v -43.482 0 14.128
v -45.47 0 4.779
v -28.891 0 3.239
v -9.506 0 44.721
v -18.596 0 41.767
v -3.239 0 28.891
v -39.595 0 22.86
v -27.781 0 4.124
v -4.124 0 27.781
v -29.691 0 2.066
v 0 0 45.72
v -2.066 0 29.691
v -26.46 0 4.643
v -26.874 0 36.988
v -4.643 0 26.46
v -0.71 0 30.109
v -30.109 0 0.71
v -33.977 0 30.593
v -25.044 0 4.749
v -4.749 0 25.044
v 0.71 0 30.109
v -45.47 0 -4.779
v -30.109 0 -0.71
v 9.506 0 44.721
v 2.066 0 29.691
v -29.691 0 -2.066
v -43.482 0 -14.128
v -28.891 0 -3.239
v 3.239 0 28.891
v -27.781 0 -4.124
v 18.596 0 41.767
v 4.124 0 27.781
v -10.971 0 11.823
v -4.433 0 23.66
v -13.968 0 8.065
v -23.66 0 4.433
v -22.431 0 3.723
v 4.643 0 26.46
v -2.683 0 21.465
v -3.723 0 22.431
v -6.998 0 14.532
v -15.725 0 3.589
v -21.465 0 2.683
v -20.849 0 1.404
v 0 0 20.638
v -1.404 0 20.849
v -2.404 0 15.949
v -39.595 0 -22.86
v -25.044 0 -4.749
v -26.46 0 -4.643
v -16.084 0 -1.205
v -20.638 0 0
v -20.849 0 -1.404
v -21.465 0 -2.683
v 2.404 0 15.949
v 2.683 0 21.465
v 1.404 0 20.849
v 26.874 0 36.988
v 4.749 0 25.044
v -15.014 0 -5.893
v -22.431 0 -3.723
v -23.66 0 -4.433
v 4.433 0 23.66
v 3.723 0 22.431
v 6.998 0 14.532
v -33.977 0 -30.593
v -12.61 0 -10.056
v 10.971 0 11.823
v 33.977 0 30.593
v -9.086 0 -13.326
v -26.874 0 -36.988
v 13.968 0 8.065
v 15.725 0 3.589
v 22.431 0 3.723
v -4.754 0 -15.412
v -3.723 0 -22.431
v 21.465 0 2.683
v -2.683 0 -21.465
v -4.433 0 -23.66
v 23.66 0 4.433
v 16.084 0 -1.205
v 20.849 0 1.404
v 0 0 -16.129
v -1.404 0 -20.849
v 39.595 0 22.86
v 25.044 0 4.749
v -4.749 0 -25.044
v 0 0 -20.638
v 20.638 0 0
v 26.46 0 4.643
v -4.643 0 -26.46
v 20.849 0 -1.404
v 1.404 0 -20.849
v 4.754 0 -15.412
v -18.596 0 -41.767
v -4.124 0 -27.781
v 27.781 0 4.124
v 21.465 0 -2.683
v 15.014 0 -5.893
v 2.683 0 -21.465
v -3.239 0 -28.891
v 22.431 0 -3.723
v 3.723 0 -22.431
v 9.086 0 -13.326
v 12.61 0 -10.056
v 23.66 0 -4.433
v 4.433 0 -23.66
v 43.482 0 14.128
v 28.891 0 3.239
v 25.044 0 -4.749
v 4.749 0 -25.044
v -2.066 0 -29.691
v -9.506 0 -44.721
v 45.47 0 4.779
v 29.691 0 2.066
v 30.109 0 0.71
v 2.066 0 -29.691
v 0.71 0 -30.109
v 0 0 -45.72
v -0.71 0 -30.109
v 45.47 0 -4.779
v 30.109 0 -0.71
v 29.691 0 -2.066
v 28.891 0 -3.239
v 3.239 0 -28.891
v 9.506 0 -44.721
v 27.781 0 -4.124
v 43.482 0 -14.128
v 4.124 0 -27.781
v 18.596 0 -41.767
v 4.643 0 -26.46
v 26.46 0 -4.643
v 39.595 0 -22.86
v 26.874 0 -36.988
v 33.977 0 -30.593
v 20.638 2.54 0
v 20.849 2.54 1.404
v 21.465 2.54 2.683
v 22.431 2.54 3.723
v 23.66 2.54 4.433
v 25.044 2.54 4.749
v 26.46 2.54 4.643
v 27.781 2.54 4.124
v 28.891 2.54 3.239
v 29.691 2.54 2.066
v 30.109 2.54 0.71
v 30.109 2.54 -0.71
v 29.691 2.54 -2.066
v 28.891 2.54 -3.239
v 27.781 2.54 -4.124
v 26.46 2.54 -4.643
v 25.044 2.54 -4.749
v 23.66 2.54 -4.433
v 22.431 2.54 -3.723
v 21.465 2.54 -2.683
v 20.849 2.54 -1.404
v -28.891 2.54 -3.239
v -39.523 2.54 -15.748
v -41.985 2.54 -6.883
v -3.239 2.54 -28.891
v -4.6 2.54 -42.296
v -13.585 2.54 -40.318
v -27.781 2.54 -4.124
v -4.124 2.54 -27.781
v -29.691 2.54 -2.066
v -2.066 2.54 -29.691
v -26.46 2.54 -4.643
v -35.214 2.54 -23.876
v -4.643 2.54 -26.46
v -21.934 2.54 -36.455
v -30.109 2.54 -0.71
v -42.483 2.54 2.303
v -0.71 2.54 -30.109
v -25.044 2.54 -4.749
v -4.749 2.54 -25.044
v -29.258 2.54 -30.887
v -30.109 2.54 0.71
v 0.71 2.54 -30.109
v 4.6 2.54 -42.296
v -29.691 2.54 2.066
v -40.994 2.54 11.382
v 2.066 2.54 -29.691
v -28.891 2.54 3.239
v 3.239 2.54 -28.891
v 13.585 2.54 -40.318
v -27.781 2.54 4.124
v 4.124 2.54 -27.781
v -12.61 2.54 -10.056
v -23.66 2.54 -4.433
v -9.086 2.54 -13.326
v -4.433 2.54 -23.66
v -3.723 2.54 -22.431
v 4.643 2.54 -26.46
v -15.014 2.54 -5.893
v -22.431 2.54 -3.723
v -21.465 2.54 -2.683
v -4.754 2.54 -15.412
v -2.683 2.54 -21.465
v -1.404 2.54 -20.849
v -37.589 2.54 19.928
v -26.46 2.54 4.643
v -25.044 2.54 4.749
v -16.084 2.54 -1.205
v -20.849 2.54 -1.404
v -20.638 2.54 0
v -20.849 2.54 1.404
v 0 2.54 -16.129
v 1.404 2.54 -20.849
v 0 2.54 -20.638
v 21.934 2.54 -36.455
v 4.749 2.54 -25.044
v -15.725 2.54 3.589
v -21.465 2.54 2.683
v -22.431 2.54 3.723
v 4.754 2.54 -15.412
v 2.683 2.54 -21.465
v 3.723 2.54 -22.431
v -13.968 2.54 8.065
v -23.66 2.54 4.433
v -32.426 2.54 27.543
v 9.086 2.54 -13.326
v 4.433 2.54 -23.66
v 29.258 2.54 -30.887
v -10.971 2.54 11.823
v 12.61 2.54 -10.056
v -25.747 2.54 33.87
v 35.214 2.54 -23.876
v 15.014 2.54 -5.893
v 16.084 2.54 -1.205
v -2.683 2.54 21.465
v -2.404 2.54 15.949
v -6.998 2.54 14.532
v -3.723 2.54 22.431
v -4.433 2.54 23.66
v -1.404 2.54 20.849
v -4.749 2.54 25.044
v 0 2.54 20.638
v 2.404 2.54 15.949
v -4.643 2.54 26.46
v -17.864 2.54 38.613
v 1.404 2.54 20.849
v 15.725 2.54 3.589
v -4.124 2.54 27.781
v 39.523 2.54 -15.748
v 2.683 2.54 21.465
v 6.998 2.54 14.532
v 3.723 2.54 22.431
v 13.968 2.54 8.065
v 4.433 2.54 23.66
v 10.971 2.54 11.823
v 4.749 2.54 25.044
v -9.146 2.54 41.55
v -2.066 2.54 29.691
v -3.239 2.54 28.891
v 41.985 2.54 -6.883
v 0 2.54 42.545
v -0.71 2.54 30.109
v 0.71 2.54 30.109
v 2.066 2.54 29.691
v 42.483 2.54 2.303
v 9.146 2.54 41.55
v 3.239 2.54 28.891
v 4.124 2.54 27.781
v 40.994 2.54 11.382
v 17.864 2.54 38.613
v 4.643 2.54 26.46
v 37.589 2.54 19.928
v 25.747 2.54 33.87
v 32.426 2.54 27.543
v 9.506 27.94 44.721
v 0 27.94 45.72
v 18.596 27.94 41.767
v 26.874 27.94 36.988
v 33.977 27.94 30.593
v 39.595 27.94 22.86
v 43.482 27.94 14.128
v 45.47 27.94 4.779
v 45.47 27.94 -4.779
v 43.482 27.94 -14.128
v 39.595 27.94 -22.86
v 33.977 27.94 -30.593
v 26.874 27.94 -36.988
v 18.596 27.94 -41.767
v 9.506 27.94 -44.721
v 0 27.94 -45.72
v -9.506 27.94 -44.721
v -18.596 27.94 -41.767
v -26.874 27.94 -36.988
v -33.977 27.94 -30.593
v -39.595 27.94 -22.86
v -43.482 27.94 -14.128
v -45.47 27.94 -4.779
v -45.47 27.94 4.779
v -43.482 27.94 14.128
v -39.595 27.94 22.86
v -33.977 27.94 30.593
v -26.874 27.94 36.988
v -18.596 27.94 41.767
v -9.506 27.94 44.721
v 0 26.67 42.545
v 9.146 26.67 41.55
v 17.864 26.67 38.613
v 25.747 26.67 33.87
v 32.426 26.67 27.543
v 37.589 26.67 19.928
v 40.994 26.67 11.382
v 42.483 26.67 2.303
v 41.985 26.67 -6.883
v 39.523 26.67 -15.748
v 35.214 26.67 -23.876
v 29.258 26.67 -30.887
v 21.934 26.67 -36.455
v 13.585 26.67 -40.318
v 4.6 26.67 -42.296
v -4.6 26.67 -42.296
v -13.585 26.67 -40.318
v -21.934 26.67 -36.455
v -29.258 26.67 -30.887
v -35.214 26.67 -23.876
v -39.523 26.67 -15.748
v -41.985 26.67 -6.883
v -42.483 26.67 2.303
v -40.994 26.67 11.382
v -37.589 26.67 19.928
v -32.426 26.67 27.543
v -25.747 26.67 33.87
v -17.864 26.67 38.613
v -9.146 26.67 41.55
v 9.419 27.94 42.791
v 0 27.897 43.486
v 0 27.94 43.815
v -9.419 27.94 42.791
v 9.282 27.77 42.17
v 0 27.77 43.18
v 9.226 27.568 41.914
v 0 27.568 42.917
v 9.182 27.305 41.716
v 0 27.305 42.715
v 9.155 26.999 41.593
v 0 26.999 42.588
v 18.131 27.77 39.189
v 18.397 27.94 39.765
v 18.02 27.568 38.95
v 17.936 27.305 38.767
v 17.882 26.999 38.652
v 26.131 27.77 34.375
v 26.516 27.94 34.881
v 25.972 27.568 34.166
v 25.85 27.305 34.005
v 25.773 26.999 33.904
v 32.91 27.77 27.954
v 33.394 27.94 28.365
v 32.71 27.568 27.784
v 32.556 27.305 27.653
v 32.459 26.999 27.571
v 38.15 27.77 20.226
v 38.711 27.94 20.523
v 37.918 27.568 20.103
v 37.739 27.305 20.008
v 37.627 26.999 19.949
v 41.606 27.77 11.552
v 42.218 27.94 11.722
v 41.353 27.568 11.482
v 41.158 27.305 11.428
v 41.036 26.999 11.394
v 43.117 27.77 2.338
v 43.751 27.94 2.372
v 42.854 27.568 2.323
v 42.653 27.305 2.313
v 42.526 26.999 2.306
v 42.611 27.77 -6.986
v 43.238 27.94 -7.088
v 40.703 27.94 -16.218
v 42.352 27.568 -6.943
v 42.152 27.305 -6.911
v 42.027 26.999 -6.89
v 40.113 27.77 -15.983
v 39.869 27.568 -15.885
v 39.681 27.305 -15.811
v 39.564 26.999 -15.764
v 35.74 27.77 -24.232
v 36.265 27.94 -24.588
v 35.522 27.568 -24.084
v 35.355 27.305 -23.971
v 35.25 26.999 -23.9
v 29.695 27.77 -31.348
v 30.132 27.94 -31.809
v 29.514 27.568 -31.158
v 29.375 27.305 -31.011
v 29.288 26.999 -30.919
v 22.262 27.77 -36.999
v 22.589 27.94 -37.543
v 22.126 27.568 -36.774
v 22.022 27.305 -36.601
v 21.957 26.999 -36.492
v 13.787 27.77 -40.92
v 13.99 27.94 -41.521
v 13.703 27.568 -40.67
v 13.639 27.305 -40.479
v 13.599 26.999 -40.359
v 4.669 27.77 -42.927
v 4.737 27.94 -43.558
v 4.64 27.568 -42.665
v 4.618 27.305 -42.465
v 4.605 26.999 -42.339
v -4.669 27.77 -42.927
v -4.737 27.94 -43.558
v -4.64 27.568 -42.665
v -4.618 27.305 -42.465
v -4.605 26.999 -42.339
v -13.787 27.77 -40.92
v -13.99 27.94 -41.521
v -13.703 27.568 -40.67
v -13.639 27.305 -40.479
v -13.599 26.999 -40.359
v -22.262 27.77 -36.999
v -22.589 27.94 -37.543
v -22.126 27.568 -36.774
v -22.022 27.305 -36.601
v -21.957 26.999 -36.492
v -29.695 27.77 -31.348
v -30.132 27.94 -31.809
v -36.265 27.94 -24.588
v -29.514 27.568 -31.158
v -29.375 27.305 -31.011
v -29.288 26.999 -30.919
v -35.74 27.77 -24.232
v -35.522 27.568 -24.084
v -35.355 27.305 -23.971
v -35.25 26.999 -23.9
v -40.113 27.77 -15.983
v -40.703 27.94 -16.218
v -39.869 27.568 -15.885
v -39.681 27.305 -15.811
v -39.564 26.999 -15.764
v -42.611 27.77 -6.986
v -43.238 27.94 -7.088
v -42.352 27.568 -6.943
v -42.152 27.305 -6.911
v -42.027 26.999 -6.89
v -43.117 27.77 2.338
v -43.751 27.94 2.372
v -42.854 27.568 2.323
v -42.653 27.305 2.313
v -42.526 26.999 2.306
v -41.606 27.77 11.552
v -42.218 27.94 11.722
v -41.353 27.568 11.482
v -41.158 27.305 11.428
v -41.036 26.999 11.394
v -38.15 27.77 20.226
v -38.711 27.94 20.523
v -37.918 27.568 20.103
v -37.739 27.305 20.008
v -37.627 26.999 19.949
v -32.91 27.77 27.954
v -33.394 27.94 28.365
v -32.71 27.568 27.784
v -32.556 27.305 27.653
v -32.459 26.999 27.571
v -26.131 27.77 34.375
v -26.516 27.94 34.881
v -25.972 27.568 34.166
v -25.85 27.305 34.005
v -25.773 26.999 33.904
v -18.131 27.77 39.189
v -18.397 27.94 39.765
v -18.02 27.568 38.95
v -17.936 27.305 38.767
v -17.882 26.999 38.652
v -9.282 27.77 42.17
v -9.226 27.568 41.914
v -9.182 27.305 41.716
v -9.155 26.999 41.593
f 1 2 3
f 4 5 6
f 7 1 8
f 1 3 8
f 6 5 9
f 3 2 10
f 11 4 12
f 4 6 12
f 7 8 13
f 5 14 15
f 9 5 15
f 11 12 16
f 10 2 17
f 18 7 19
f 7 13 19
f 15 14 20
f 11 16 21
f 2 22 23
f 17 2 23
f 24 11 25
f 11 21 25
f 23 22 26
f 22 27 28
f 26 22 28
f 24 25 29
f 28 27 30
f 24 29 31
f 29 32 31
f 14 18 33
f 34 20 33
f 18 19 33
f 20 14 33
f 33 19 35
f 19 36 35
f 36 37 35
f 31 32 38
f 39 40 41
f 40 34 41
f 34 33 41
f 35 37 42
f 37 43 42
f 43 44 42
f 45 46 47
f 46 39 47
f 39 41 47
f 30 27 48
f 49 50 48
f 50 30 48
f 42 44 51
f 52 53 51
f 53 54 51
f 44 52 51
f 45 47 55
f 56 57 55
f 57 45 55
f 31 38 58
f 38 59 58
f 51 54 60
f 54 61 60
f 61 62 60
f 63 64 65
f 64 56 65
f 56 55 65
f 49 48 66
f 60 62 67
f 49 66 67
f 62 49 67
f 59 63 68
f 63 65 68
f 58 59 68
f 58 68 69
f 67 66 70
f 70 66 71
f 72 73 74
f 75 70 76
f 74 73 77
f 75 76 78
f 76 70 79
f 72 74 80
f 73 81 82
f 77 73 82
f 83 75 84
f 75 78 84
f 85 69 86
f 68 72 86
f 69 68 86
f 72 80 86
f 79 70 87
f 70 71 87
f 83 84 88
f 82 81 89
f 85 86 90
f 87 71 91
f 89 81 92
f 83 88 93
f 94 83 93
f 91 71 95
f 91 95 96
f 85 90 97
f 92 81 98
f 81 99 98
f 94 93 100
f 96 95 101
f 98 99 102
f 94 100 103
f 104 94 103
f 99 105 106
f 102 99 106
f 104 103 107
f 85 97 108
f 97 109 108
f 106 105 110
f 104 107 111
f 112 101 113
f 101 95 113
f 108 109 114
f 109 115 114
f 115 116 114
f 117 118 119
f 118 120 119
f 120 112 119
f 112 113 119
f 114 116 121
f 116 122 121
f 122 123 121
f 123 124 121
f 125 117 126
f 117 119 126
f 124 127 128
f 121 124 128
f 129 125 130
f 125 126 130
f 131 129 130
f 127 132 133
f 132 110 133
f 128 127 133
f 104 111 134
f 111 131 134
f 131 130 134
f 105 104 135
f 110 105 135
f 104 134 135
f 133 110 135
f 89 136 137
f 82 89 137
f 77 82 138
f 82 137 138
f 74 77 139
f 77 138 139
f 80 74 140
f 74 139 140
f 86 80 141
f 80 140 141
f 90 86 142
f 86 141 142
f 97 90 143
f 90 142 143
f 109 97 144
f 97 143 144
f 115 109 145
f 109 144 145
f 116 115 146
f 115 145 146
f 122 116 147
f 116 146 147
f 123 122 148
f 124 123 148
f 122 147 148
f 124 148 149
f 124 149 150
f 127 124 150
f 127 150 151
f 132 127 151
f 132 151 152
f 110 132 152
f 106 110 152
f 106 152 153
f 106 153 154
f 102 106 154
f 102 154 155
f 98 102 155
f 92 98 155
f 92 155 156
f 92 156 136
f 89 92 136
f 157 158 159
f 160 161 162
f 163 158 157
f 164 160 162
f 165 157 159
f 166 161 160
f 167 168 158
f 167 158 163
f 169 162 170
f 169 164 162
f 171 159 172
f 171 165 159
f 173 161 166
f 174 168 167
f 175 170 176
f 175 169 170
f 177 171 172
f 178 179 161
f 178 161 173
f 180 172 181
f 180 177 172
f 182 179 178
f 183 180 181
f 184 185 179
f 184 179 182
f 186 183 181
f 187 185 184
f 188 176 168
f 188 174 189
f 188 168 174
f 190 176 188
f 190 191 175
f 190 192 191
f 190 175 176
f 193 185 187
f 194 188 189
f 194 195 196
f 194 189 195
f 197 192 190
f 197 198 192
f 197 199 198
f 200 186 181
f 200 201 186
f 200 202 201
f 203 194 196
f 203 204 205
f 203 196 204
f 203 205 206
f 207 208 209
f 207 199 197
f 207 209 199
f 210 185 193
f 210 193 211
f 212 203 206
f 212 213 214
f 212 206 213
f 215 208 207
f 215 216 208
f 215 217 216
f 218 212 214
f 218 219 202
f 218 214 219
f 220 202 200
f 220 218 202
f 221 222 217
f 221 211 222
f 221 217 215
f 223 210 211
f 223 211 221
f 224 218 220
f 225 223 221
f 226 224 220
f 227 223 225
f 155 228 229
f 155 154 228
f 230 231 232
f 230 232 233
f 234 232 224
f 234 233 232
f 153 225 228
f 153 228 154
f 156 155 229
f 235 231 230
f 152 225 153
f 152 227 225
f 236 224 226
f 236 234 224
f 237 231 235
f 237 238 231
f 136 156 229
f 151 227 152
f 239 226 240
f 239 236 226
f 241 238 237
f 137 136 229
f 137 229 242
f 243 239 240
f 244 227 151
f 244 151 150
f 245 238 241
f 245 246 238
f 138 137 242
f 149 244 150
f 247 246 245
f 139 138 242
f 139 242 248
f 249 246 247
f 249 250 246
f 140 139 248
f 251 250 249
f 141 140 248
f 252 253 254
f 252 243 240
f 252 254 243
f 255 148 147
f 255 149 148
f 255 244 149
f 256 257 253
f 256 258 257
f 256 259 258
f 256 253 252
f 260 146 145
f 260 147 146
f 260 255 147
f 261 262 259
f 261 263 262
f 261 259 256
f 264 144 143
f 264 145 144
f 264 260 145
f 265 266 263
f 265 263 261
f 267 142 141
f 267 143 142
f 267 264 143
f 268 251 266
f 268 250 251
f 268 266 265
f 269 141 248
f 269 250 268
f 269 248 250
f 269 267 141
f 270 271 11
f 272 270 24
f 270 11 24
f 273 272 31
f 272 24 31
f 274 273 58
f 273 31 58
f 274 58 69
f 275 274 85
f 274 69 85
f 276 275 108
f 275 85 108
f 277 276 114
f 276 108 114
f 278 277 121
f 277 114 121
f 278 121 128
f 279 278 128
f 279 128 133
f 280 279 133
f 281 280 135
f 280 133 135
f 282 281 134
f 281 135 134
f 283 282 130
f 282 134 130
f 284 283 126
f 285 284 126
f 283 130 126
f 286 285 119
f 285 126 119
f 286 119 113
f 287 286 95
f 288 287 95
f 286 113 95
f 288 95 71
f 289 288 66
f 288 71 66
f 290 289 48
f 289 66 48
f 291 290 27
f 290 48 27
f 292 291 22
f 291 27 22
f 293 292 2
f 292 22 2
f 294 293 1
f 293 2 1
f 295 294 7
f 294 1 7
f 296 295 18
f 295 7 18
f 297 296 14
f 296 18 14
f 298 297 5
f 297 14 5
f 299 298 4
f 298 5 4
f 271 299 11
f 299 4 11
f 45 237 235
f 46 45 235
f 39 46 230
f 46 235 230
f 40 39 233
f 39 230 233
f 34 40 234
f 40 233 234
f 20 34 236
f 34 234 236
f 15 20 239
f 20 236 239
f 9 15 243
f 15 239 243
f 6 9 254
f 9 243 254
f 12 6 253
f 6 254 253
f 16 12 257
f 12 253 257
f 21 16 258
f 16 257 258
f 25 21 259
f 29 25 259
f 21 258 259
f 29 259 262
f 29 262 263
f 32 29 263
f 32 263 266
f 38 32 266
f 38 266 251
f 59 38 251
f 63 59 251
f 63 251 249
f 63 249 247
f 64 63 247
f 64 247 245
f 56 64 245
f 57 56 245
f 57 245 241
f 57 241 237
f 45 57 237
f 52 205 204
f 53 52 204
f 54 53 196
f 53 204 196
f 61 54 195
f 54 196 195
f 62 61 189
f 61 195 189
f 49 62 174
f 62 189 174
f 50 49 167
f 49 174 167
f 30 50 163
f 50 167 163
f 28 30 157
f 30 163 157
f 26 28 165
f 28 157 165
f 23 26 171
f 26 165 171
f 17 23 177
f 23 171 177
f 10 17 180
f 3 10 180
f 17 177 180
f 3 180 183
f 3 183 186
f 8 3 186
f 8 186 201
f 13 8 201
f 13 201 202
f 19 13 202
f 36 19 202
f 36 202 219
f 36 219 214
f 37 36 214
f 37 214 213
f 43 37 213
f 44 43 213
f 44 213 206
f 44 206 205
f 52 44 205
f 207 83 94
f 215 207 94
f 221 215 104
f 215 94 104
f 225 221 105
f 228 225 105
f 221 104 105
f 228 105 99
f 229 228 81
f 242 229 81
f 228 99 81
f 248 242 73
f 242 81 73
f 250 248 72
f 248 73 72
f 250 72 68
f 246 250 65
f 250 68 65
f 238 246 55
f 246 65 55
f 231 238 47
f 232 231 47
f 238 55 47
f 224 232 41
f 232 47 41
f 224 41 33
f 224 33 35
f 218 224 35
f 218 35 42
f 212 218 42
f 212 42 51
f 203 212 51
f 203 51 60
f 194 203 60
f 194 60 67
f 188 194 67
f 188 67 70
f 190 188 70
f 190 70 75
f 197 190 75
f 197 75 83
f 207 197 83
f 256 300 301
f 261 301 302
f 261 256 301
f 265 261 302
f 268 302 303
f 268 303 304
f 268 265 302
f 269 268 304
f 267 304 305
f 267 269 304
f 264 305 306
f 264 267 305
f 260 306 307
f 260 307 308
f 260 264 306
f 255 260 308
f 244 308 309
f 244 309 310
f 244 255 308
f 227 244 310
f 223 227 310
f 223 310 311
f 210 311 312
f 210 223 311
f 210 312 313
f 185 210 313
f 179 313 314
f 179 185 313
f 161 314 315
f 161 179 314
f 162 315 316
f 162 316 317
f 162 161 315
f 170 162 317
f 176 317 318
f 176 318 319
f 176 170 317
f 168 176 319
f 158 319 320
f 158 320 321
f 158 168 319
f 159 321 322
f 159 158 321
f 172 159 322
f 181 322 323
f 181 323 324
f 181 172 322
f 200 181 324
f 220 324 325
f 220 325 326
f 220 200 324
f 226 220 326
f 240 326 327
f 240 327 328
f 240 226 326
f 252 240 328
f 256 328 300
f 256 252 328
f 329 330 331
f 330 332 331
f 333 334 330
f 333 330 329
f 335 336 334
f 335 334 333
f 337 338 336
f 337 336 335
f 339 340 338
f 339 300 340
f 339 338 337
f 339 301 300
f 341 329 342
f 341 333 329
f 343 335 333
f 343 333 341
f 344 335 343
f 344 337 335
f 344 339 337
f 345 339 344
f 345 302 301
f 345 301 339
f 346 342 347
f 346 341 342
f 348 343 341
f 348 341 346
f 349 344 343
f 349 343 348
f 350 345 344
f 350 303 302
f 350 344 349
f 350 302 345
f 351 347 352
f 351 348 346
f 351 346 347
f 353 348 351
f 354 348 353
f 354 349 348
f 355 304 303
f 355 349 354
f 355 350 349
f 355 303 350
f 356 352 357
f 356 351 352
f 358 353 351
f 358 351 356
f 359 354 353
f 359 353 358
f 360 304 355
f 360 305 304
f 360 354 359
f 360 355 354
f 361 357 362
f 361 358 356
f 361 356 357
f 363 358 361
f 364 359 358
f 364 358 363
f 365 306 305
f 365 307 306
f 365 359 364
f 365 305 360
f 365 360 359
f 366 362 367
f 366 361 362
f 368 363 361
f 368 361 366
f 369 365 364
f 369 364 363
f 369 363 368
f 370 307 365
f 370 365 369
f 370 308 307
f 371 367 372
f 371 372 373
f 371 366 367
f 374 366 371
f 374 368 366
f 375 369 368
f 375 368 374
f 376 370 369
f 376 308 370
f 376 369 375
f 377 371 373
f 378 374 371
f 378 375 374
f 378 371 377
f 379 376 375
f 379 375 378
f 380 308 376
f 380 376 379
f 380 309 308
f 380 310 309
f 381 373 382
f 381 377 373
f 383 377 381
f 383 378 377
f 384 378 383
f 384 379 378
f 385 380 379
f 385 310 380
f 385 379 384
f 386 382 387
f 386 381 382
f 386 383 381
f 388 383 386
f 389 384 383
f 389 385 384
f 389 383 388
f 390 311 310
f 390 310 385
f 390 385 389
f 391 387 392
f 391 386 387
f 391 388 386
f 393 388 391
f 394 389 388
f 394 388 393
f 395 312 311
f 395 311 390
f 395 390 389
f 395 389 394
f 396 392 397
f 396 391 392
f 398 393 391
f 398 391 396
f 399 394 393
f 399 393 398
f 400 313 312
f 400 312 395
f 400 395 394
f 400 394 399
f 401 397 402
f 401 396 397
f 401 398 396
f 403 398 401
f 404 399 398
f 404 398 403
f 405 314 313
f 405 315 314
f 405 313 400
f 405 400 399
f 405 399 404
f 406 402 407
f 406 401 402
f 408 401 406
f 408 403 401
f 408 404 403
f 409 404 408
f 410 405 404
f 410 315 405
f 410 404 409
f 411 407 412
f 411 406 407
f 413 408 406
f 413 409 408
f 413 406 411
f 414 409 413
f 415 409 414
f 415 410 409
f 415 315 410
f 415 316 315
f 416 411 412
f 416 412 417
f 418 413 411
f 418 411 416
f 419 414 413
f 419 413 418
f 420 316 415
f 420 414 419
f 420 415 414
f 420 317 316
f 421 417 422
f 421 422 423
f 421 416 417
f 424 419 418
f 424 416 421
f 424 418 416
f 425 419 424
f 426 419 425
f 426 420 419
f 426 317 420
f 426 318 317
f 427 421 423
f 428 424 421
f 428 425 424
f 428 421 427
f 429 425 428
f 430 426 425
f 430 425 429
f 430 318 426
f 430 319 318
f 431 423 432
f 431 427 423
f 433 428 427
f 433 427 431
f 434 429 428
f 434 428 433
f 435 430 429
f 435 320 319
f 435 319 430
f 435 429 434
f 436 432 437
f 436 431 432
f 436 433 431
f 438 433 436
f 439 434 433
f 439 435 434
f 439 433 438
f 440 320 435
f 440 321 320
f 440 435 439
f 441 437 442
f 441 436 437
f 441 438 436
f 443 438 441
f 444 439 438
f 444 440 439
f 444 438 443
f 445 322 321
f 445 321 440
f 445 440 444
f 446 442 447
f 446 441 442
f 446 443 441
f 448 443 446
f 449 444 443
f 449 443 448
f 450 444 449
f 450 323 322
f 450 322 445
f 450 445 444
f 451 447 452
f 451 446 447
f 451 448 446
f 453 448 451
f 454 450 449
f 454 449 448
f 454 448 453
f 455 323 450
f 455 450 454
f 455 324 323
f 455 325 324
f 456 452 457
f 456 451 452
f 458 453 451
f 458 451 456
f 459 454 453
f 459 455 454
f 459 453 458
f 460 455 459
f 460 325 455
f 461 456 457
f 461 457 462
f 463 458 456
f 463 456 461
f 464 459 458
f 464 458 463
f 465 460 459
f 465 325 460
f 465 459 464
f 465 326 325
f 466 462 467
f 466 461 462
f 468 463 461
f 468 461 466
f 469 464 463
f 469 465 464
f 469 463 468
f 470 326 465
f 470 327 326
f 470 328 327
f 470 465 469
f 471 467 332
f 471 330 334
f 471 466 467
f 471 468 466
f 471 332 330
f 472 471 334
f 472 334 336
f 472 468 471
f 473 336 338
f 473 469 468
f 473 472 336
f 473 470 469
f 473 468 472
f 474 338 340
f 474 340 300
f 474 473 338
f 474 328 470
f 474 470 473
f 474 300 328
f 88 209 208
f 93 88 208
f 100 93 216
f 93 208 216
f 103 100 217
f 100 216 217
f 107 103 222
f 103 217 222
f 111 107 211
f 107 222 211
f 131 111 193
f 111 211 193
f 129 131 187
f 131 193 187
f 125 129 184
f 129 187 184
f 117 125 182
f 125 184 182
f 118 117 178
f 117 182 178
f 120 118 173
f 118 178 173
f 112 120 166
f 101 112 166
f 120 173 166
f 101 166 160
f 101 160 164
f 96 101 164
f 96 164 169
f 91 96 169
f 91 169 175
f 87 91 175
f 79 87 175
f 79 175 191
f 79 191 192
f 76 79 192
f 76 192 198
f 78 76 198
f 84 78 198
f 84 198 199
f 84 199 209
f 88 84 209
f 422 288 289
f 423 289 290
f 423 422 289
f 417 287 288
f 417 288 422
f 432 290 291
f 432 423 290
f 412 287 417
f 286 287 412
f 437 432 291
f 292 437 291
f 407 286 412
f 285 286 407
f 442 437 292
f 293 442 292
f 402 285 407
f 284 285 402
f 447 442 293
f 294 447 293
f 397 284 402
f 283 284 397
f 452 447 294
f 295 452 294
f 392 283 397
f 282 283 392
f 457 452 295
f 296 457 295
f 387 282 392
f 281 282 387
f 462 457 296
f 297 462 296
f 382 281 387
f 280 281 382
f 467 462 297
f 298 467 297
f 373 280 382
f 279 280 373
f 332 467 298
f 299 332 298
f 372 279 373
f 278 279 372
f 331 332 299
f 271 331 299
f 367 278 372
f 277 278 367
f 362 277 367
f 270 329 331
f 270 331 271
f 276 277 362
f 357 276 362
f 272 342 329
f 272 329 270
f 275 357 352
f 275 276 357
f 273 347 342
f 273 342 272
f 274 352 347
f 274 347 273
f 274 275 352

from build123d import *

# Parameters (mm, degrees)
SKETCH1_R           = 45.72
SKETCH1_R_2         = 42.545
BOSS_EXTRUDE1_DEPTH = 2.54
SKETCH2_R           = 45.72
SKETCH2_R_2         = 42.545
BOSS_EXTRUDE2_DEPTH = 25.4
CUT_EXTRUDE1_REACH  = 72.436
SKETCH3_R           = 16.129
FILLET1_R           = 1.27
CUT_EXTRUDE2_REACH  = 71.468
SKETCH5_R           = 4.7625
CIRPATTERN1_COUNT   = 4


with BuildPart() as part:
    # Sketch1 → Boss-Extrude1 (new body)
    # profile 1 of 2: a face of its own
    with BuildSketch(Plane(origin=(0, 0, 0), x_dir=(1, 0, 0), z_dir=(0, 1, 0))):
        with Locations(Location((0, 0, 0), (0, 0, 270))):
            Circle(SKETCH1_R)
        Circle(SKETCH1_R_2, mode=Mode.SUBTRACT)
    # profile 2 of 2: a face of its own
    with BuildSketch(Plane(origin=(0, 0, 0), x_dir=(1, 0, 0), z_dir=(0, 1, 0))):
        Circle(SKETCH1_R_2)
    extrude(amount=BOSS_EXTRUDE1_DEPTH)

    # Sketch2 → Boss-Extrude2 (add)
    with BuildSketch(Plane(origin=(0, 2.54, 0), x_dir=(1, 0, 0), z_dir=(0, 1, 0))):
        with Locations(Location((0, 0, 0), (0, 0, 270))):
            Circle(SKETCH2_R)
        with Locations(Location((0, 0, 0), (0, 0, 270))):
            Circle(SKETCH2_R_2, mode=Mode.SUBTRACT)
    extrude(amount=BOSS_EXTRUDE2_DEPTH)

    # Sketch3 → Cut-Extrude1 (cut, up to next)
    with BuildSketch(Plane.XZ, mode=Mode.PRIVATE) as cut_extrude1_sk1:
        with Locations(Location((0, 0, 0), (0, 0, 270))):
            Circle(SKETCH3_R)
    cut_extrude1_tool1 = extrude(cut_extrude1_sk1.sketch, amount=-CUT_EXTRUDE1_REACH, mode=Mode.PRIVATE) & part.part
    add(cut_extrude1_tool1.solids().sort_by_distance((0, 0, 0))[0], mode=Mode.SUBTRACT)

    # Fillet1
    fillet1_edges = [part.edges().sort_by_distance(p)[0] for p in [
        (0, 27.94, -42.545),
    ]]
    fillet(fillet1_edges, radius=FILLET1_R)

    # Sketch5 → Cut-Extrude2 (cut, up to next)
    with BuildSketch(Plane(origin=(0, 2.54, 0), x_dir=(1, 0, 0), z_dir=(0, 1, 0)), mode=Mode.PRIVATE) as cut_extrude2_sk1:
        with Locations(Location((0, 25.4, 0), (0, 0, 270))):
            Circle(SKETCH5_R)
    cut_extrude2_tool1 = extrude(cut_extrude2_sk1.sketch, amount=-CUT_EXTRUDE2_REACH, mode=Mode.PRIVATE) & part.part
    cut_extrude2 = cut_extrude2_tool1.solids().sort_by_distance((0, 2.54, -25.4))[0]
    add(cut_extrude2, mode=Mode.SUBTRACT)

    # CirPattern1: Cut-Extrude2 ×4 about axis
    cirpattern1_axis = Axis((0, 0, 0), (0, 1, 0))
    for i in range(1, CIRPATTERN1_COUNT):
        add(cut_extrude2.rotate(cirpattern1_axis, i * 360 / CIRPATTERN1_COUNT), mode=Mode.SUBTRACT)


solid = part.part
